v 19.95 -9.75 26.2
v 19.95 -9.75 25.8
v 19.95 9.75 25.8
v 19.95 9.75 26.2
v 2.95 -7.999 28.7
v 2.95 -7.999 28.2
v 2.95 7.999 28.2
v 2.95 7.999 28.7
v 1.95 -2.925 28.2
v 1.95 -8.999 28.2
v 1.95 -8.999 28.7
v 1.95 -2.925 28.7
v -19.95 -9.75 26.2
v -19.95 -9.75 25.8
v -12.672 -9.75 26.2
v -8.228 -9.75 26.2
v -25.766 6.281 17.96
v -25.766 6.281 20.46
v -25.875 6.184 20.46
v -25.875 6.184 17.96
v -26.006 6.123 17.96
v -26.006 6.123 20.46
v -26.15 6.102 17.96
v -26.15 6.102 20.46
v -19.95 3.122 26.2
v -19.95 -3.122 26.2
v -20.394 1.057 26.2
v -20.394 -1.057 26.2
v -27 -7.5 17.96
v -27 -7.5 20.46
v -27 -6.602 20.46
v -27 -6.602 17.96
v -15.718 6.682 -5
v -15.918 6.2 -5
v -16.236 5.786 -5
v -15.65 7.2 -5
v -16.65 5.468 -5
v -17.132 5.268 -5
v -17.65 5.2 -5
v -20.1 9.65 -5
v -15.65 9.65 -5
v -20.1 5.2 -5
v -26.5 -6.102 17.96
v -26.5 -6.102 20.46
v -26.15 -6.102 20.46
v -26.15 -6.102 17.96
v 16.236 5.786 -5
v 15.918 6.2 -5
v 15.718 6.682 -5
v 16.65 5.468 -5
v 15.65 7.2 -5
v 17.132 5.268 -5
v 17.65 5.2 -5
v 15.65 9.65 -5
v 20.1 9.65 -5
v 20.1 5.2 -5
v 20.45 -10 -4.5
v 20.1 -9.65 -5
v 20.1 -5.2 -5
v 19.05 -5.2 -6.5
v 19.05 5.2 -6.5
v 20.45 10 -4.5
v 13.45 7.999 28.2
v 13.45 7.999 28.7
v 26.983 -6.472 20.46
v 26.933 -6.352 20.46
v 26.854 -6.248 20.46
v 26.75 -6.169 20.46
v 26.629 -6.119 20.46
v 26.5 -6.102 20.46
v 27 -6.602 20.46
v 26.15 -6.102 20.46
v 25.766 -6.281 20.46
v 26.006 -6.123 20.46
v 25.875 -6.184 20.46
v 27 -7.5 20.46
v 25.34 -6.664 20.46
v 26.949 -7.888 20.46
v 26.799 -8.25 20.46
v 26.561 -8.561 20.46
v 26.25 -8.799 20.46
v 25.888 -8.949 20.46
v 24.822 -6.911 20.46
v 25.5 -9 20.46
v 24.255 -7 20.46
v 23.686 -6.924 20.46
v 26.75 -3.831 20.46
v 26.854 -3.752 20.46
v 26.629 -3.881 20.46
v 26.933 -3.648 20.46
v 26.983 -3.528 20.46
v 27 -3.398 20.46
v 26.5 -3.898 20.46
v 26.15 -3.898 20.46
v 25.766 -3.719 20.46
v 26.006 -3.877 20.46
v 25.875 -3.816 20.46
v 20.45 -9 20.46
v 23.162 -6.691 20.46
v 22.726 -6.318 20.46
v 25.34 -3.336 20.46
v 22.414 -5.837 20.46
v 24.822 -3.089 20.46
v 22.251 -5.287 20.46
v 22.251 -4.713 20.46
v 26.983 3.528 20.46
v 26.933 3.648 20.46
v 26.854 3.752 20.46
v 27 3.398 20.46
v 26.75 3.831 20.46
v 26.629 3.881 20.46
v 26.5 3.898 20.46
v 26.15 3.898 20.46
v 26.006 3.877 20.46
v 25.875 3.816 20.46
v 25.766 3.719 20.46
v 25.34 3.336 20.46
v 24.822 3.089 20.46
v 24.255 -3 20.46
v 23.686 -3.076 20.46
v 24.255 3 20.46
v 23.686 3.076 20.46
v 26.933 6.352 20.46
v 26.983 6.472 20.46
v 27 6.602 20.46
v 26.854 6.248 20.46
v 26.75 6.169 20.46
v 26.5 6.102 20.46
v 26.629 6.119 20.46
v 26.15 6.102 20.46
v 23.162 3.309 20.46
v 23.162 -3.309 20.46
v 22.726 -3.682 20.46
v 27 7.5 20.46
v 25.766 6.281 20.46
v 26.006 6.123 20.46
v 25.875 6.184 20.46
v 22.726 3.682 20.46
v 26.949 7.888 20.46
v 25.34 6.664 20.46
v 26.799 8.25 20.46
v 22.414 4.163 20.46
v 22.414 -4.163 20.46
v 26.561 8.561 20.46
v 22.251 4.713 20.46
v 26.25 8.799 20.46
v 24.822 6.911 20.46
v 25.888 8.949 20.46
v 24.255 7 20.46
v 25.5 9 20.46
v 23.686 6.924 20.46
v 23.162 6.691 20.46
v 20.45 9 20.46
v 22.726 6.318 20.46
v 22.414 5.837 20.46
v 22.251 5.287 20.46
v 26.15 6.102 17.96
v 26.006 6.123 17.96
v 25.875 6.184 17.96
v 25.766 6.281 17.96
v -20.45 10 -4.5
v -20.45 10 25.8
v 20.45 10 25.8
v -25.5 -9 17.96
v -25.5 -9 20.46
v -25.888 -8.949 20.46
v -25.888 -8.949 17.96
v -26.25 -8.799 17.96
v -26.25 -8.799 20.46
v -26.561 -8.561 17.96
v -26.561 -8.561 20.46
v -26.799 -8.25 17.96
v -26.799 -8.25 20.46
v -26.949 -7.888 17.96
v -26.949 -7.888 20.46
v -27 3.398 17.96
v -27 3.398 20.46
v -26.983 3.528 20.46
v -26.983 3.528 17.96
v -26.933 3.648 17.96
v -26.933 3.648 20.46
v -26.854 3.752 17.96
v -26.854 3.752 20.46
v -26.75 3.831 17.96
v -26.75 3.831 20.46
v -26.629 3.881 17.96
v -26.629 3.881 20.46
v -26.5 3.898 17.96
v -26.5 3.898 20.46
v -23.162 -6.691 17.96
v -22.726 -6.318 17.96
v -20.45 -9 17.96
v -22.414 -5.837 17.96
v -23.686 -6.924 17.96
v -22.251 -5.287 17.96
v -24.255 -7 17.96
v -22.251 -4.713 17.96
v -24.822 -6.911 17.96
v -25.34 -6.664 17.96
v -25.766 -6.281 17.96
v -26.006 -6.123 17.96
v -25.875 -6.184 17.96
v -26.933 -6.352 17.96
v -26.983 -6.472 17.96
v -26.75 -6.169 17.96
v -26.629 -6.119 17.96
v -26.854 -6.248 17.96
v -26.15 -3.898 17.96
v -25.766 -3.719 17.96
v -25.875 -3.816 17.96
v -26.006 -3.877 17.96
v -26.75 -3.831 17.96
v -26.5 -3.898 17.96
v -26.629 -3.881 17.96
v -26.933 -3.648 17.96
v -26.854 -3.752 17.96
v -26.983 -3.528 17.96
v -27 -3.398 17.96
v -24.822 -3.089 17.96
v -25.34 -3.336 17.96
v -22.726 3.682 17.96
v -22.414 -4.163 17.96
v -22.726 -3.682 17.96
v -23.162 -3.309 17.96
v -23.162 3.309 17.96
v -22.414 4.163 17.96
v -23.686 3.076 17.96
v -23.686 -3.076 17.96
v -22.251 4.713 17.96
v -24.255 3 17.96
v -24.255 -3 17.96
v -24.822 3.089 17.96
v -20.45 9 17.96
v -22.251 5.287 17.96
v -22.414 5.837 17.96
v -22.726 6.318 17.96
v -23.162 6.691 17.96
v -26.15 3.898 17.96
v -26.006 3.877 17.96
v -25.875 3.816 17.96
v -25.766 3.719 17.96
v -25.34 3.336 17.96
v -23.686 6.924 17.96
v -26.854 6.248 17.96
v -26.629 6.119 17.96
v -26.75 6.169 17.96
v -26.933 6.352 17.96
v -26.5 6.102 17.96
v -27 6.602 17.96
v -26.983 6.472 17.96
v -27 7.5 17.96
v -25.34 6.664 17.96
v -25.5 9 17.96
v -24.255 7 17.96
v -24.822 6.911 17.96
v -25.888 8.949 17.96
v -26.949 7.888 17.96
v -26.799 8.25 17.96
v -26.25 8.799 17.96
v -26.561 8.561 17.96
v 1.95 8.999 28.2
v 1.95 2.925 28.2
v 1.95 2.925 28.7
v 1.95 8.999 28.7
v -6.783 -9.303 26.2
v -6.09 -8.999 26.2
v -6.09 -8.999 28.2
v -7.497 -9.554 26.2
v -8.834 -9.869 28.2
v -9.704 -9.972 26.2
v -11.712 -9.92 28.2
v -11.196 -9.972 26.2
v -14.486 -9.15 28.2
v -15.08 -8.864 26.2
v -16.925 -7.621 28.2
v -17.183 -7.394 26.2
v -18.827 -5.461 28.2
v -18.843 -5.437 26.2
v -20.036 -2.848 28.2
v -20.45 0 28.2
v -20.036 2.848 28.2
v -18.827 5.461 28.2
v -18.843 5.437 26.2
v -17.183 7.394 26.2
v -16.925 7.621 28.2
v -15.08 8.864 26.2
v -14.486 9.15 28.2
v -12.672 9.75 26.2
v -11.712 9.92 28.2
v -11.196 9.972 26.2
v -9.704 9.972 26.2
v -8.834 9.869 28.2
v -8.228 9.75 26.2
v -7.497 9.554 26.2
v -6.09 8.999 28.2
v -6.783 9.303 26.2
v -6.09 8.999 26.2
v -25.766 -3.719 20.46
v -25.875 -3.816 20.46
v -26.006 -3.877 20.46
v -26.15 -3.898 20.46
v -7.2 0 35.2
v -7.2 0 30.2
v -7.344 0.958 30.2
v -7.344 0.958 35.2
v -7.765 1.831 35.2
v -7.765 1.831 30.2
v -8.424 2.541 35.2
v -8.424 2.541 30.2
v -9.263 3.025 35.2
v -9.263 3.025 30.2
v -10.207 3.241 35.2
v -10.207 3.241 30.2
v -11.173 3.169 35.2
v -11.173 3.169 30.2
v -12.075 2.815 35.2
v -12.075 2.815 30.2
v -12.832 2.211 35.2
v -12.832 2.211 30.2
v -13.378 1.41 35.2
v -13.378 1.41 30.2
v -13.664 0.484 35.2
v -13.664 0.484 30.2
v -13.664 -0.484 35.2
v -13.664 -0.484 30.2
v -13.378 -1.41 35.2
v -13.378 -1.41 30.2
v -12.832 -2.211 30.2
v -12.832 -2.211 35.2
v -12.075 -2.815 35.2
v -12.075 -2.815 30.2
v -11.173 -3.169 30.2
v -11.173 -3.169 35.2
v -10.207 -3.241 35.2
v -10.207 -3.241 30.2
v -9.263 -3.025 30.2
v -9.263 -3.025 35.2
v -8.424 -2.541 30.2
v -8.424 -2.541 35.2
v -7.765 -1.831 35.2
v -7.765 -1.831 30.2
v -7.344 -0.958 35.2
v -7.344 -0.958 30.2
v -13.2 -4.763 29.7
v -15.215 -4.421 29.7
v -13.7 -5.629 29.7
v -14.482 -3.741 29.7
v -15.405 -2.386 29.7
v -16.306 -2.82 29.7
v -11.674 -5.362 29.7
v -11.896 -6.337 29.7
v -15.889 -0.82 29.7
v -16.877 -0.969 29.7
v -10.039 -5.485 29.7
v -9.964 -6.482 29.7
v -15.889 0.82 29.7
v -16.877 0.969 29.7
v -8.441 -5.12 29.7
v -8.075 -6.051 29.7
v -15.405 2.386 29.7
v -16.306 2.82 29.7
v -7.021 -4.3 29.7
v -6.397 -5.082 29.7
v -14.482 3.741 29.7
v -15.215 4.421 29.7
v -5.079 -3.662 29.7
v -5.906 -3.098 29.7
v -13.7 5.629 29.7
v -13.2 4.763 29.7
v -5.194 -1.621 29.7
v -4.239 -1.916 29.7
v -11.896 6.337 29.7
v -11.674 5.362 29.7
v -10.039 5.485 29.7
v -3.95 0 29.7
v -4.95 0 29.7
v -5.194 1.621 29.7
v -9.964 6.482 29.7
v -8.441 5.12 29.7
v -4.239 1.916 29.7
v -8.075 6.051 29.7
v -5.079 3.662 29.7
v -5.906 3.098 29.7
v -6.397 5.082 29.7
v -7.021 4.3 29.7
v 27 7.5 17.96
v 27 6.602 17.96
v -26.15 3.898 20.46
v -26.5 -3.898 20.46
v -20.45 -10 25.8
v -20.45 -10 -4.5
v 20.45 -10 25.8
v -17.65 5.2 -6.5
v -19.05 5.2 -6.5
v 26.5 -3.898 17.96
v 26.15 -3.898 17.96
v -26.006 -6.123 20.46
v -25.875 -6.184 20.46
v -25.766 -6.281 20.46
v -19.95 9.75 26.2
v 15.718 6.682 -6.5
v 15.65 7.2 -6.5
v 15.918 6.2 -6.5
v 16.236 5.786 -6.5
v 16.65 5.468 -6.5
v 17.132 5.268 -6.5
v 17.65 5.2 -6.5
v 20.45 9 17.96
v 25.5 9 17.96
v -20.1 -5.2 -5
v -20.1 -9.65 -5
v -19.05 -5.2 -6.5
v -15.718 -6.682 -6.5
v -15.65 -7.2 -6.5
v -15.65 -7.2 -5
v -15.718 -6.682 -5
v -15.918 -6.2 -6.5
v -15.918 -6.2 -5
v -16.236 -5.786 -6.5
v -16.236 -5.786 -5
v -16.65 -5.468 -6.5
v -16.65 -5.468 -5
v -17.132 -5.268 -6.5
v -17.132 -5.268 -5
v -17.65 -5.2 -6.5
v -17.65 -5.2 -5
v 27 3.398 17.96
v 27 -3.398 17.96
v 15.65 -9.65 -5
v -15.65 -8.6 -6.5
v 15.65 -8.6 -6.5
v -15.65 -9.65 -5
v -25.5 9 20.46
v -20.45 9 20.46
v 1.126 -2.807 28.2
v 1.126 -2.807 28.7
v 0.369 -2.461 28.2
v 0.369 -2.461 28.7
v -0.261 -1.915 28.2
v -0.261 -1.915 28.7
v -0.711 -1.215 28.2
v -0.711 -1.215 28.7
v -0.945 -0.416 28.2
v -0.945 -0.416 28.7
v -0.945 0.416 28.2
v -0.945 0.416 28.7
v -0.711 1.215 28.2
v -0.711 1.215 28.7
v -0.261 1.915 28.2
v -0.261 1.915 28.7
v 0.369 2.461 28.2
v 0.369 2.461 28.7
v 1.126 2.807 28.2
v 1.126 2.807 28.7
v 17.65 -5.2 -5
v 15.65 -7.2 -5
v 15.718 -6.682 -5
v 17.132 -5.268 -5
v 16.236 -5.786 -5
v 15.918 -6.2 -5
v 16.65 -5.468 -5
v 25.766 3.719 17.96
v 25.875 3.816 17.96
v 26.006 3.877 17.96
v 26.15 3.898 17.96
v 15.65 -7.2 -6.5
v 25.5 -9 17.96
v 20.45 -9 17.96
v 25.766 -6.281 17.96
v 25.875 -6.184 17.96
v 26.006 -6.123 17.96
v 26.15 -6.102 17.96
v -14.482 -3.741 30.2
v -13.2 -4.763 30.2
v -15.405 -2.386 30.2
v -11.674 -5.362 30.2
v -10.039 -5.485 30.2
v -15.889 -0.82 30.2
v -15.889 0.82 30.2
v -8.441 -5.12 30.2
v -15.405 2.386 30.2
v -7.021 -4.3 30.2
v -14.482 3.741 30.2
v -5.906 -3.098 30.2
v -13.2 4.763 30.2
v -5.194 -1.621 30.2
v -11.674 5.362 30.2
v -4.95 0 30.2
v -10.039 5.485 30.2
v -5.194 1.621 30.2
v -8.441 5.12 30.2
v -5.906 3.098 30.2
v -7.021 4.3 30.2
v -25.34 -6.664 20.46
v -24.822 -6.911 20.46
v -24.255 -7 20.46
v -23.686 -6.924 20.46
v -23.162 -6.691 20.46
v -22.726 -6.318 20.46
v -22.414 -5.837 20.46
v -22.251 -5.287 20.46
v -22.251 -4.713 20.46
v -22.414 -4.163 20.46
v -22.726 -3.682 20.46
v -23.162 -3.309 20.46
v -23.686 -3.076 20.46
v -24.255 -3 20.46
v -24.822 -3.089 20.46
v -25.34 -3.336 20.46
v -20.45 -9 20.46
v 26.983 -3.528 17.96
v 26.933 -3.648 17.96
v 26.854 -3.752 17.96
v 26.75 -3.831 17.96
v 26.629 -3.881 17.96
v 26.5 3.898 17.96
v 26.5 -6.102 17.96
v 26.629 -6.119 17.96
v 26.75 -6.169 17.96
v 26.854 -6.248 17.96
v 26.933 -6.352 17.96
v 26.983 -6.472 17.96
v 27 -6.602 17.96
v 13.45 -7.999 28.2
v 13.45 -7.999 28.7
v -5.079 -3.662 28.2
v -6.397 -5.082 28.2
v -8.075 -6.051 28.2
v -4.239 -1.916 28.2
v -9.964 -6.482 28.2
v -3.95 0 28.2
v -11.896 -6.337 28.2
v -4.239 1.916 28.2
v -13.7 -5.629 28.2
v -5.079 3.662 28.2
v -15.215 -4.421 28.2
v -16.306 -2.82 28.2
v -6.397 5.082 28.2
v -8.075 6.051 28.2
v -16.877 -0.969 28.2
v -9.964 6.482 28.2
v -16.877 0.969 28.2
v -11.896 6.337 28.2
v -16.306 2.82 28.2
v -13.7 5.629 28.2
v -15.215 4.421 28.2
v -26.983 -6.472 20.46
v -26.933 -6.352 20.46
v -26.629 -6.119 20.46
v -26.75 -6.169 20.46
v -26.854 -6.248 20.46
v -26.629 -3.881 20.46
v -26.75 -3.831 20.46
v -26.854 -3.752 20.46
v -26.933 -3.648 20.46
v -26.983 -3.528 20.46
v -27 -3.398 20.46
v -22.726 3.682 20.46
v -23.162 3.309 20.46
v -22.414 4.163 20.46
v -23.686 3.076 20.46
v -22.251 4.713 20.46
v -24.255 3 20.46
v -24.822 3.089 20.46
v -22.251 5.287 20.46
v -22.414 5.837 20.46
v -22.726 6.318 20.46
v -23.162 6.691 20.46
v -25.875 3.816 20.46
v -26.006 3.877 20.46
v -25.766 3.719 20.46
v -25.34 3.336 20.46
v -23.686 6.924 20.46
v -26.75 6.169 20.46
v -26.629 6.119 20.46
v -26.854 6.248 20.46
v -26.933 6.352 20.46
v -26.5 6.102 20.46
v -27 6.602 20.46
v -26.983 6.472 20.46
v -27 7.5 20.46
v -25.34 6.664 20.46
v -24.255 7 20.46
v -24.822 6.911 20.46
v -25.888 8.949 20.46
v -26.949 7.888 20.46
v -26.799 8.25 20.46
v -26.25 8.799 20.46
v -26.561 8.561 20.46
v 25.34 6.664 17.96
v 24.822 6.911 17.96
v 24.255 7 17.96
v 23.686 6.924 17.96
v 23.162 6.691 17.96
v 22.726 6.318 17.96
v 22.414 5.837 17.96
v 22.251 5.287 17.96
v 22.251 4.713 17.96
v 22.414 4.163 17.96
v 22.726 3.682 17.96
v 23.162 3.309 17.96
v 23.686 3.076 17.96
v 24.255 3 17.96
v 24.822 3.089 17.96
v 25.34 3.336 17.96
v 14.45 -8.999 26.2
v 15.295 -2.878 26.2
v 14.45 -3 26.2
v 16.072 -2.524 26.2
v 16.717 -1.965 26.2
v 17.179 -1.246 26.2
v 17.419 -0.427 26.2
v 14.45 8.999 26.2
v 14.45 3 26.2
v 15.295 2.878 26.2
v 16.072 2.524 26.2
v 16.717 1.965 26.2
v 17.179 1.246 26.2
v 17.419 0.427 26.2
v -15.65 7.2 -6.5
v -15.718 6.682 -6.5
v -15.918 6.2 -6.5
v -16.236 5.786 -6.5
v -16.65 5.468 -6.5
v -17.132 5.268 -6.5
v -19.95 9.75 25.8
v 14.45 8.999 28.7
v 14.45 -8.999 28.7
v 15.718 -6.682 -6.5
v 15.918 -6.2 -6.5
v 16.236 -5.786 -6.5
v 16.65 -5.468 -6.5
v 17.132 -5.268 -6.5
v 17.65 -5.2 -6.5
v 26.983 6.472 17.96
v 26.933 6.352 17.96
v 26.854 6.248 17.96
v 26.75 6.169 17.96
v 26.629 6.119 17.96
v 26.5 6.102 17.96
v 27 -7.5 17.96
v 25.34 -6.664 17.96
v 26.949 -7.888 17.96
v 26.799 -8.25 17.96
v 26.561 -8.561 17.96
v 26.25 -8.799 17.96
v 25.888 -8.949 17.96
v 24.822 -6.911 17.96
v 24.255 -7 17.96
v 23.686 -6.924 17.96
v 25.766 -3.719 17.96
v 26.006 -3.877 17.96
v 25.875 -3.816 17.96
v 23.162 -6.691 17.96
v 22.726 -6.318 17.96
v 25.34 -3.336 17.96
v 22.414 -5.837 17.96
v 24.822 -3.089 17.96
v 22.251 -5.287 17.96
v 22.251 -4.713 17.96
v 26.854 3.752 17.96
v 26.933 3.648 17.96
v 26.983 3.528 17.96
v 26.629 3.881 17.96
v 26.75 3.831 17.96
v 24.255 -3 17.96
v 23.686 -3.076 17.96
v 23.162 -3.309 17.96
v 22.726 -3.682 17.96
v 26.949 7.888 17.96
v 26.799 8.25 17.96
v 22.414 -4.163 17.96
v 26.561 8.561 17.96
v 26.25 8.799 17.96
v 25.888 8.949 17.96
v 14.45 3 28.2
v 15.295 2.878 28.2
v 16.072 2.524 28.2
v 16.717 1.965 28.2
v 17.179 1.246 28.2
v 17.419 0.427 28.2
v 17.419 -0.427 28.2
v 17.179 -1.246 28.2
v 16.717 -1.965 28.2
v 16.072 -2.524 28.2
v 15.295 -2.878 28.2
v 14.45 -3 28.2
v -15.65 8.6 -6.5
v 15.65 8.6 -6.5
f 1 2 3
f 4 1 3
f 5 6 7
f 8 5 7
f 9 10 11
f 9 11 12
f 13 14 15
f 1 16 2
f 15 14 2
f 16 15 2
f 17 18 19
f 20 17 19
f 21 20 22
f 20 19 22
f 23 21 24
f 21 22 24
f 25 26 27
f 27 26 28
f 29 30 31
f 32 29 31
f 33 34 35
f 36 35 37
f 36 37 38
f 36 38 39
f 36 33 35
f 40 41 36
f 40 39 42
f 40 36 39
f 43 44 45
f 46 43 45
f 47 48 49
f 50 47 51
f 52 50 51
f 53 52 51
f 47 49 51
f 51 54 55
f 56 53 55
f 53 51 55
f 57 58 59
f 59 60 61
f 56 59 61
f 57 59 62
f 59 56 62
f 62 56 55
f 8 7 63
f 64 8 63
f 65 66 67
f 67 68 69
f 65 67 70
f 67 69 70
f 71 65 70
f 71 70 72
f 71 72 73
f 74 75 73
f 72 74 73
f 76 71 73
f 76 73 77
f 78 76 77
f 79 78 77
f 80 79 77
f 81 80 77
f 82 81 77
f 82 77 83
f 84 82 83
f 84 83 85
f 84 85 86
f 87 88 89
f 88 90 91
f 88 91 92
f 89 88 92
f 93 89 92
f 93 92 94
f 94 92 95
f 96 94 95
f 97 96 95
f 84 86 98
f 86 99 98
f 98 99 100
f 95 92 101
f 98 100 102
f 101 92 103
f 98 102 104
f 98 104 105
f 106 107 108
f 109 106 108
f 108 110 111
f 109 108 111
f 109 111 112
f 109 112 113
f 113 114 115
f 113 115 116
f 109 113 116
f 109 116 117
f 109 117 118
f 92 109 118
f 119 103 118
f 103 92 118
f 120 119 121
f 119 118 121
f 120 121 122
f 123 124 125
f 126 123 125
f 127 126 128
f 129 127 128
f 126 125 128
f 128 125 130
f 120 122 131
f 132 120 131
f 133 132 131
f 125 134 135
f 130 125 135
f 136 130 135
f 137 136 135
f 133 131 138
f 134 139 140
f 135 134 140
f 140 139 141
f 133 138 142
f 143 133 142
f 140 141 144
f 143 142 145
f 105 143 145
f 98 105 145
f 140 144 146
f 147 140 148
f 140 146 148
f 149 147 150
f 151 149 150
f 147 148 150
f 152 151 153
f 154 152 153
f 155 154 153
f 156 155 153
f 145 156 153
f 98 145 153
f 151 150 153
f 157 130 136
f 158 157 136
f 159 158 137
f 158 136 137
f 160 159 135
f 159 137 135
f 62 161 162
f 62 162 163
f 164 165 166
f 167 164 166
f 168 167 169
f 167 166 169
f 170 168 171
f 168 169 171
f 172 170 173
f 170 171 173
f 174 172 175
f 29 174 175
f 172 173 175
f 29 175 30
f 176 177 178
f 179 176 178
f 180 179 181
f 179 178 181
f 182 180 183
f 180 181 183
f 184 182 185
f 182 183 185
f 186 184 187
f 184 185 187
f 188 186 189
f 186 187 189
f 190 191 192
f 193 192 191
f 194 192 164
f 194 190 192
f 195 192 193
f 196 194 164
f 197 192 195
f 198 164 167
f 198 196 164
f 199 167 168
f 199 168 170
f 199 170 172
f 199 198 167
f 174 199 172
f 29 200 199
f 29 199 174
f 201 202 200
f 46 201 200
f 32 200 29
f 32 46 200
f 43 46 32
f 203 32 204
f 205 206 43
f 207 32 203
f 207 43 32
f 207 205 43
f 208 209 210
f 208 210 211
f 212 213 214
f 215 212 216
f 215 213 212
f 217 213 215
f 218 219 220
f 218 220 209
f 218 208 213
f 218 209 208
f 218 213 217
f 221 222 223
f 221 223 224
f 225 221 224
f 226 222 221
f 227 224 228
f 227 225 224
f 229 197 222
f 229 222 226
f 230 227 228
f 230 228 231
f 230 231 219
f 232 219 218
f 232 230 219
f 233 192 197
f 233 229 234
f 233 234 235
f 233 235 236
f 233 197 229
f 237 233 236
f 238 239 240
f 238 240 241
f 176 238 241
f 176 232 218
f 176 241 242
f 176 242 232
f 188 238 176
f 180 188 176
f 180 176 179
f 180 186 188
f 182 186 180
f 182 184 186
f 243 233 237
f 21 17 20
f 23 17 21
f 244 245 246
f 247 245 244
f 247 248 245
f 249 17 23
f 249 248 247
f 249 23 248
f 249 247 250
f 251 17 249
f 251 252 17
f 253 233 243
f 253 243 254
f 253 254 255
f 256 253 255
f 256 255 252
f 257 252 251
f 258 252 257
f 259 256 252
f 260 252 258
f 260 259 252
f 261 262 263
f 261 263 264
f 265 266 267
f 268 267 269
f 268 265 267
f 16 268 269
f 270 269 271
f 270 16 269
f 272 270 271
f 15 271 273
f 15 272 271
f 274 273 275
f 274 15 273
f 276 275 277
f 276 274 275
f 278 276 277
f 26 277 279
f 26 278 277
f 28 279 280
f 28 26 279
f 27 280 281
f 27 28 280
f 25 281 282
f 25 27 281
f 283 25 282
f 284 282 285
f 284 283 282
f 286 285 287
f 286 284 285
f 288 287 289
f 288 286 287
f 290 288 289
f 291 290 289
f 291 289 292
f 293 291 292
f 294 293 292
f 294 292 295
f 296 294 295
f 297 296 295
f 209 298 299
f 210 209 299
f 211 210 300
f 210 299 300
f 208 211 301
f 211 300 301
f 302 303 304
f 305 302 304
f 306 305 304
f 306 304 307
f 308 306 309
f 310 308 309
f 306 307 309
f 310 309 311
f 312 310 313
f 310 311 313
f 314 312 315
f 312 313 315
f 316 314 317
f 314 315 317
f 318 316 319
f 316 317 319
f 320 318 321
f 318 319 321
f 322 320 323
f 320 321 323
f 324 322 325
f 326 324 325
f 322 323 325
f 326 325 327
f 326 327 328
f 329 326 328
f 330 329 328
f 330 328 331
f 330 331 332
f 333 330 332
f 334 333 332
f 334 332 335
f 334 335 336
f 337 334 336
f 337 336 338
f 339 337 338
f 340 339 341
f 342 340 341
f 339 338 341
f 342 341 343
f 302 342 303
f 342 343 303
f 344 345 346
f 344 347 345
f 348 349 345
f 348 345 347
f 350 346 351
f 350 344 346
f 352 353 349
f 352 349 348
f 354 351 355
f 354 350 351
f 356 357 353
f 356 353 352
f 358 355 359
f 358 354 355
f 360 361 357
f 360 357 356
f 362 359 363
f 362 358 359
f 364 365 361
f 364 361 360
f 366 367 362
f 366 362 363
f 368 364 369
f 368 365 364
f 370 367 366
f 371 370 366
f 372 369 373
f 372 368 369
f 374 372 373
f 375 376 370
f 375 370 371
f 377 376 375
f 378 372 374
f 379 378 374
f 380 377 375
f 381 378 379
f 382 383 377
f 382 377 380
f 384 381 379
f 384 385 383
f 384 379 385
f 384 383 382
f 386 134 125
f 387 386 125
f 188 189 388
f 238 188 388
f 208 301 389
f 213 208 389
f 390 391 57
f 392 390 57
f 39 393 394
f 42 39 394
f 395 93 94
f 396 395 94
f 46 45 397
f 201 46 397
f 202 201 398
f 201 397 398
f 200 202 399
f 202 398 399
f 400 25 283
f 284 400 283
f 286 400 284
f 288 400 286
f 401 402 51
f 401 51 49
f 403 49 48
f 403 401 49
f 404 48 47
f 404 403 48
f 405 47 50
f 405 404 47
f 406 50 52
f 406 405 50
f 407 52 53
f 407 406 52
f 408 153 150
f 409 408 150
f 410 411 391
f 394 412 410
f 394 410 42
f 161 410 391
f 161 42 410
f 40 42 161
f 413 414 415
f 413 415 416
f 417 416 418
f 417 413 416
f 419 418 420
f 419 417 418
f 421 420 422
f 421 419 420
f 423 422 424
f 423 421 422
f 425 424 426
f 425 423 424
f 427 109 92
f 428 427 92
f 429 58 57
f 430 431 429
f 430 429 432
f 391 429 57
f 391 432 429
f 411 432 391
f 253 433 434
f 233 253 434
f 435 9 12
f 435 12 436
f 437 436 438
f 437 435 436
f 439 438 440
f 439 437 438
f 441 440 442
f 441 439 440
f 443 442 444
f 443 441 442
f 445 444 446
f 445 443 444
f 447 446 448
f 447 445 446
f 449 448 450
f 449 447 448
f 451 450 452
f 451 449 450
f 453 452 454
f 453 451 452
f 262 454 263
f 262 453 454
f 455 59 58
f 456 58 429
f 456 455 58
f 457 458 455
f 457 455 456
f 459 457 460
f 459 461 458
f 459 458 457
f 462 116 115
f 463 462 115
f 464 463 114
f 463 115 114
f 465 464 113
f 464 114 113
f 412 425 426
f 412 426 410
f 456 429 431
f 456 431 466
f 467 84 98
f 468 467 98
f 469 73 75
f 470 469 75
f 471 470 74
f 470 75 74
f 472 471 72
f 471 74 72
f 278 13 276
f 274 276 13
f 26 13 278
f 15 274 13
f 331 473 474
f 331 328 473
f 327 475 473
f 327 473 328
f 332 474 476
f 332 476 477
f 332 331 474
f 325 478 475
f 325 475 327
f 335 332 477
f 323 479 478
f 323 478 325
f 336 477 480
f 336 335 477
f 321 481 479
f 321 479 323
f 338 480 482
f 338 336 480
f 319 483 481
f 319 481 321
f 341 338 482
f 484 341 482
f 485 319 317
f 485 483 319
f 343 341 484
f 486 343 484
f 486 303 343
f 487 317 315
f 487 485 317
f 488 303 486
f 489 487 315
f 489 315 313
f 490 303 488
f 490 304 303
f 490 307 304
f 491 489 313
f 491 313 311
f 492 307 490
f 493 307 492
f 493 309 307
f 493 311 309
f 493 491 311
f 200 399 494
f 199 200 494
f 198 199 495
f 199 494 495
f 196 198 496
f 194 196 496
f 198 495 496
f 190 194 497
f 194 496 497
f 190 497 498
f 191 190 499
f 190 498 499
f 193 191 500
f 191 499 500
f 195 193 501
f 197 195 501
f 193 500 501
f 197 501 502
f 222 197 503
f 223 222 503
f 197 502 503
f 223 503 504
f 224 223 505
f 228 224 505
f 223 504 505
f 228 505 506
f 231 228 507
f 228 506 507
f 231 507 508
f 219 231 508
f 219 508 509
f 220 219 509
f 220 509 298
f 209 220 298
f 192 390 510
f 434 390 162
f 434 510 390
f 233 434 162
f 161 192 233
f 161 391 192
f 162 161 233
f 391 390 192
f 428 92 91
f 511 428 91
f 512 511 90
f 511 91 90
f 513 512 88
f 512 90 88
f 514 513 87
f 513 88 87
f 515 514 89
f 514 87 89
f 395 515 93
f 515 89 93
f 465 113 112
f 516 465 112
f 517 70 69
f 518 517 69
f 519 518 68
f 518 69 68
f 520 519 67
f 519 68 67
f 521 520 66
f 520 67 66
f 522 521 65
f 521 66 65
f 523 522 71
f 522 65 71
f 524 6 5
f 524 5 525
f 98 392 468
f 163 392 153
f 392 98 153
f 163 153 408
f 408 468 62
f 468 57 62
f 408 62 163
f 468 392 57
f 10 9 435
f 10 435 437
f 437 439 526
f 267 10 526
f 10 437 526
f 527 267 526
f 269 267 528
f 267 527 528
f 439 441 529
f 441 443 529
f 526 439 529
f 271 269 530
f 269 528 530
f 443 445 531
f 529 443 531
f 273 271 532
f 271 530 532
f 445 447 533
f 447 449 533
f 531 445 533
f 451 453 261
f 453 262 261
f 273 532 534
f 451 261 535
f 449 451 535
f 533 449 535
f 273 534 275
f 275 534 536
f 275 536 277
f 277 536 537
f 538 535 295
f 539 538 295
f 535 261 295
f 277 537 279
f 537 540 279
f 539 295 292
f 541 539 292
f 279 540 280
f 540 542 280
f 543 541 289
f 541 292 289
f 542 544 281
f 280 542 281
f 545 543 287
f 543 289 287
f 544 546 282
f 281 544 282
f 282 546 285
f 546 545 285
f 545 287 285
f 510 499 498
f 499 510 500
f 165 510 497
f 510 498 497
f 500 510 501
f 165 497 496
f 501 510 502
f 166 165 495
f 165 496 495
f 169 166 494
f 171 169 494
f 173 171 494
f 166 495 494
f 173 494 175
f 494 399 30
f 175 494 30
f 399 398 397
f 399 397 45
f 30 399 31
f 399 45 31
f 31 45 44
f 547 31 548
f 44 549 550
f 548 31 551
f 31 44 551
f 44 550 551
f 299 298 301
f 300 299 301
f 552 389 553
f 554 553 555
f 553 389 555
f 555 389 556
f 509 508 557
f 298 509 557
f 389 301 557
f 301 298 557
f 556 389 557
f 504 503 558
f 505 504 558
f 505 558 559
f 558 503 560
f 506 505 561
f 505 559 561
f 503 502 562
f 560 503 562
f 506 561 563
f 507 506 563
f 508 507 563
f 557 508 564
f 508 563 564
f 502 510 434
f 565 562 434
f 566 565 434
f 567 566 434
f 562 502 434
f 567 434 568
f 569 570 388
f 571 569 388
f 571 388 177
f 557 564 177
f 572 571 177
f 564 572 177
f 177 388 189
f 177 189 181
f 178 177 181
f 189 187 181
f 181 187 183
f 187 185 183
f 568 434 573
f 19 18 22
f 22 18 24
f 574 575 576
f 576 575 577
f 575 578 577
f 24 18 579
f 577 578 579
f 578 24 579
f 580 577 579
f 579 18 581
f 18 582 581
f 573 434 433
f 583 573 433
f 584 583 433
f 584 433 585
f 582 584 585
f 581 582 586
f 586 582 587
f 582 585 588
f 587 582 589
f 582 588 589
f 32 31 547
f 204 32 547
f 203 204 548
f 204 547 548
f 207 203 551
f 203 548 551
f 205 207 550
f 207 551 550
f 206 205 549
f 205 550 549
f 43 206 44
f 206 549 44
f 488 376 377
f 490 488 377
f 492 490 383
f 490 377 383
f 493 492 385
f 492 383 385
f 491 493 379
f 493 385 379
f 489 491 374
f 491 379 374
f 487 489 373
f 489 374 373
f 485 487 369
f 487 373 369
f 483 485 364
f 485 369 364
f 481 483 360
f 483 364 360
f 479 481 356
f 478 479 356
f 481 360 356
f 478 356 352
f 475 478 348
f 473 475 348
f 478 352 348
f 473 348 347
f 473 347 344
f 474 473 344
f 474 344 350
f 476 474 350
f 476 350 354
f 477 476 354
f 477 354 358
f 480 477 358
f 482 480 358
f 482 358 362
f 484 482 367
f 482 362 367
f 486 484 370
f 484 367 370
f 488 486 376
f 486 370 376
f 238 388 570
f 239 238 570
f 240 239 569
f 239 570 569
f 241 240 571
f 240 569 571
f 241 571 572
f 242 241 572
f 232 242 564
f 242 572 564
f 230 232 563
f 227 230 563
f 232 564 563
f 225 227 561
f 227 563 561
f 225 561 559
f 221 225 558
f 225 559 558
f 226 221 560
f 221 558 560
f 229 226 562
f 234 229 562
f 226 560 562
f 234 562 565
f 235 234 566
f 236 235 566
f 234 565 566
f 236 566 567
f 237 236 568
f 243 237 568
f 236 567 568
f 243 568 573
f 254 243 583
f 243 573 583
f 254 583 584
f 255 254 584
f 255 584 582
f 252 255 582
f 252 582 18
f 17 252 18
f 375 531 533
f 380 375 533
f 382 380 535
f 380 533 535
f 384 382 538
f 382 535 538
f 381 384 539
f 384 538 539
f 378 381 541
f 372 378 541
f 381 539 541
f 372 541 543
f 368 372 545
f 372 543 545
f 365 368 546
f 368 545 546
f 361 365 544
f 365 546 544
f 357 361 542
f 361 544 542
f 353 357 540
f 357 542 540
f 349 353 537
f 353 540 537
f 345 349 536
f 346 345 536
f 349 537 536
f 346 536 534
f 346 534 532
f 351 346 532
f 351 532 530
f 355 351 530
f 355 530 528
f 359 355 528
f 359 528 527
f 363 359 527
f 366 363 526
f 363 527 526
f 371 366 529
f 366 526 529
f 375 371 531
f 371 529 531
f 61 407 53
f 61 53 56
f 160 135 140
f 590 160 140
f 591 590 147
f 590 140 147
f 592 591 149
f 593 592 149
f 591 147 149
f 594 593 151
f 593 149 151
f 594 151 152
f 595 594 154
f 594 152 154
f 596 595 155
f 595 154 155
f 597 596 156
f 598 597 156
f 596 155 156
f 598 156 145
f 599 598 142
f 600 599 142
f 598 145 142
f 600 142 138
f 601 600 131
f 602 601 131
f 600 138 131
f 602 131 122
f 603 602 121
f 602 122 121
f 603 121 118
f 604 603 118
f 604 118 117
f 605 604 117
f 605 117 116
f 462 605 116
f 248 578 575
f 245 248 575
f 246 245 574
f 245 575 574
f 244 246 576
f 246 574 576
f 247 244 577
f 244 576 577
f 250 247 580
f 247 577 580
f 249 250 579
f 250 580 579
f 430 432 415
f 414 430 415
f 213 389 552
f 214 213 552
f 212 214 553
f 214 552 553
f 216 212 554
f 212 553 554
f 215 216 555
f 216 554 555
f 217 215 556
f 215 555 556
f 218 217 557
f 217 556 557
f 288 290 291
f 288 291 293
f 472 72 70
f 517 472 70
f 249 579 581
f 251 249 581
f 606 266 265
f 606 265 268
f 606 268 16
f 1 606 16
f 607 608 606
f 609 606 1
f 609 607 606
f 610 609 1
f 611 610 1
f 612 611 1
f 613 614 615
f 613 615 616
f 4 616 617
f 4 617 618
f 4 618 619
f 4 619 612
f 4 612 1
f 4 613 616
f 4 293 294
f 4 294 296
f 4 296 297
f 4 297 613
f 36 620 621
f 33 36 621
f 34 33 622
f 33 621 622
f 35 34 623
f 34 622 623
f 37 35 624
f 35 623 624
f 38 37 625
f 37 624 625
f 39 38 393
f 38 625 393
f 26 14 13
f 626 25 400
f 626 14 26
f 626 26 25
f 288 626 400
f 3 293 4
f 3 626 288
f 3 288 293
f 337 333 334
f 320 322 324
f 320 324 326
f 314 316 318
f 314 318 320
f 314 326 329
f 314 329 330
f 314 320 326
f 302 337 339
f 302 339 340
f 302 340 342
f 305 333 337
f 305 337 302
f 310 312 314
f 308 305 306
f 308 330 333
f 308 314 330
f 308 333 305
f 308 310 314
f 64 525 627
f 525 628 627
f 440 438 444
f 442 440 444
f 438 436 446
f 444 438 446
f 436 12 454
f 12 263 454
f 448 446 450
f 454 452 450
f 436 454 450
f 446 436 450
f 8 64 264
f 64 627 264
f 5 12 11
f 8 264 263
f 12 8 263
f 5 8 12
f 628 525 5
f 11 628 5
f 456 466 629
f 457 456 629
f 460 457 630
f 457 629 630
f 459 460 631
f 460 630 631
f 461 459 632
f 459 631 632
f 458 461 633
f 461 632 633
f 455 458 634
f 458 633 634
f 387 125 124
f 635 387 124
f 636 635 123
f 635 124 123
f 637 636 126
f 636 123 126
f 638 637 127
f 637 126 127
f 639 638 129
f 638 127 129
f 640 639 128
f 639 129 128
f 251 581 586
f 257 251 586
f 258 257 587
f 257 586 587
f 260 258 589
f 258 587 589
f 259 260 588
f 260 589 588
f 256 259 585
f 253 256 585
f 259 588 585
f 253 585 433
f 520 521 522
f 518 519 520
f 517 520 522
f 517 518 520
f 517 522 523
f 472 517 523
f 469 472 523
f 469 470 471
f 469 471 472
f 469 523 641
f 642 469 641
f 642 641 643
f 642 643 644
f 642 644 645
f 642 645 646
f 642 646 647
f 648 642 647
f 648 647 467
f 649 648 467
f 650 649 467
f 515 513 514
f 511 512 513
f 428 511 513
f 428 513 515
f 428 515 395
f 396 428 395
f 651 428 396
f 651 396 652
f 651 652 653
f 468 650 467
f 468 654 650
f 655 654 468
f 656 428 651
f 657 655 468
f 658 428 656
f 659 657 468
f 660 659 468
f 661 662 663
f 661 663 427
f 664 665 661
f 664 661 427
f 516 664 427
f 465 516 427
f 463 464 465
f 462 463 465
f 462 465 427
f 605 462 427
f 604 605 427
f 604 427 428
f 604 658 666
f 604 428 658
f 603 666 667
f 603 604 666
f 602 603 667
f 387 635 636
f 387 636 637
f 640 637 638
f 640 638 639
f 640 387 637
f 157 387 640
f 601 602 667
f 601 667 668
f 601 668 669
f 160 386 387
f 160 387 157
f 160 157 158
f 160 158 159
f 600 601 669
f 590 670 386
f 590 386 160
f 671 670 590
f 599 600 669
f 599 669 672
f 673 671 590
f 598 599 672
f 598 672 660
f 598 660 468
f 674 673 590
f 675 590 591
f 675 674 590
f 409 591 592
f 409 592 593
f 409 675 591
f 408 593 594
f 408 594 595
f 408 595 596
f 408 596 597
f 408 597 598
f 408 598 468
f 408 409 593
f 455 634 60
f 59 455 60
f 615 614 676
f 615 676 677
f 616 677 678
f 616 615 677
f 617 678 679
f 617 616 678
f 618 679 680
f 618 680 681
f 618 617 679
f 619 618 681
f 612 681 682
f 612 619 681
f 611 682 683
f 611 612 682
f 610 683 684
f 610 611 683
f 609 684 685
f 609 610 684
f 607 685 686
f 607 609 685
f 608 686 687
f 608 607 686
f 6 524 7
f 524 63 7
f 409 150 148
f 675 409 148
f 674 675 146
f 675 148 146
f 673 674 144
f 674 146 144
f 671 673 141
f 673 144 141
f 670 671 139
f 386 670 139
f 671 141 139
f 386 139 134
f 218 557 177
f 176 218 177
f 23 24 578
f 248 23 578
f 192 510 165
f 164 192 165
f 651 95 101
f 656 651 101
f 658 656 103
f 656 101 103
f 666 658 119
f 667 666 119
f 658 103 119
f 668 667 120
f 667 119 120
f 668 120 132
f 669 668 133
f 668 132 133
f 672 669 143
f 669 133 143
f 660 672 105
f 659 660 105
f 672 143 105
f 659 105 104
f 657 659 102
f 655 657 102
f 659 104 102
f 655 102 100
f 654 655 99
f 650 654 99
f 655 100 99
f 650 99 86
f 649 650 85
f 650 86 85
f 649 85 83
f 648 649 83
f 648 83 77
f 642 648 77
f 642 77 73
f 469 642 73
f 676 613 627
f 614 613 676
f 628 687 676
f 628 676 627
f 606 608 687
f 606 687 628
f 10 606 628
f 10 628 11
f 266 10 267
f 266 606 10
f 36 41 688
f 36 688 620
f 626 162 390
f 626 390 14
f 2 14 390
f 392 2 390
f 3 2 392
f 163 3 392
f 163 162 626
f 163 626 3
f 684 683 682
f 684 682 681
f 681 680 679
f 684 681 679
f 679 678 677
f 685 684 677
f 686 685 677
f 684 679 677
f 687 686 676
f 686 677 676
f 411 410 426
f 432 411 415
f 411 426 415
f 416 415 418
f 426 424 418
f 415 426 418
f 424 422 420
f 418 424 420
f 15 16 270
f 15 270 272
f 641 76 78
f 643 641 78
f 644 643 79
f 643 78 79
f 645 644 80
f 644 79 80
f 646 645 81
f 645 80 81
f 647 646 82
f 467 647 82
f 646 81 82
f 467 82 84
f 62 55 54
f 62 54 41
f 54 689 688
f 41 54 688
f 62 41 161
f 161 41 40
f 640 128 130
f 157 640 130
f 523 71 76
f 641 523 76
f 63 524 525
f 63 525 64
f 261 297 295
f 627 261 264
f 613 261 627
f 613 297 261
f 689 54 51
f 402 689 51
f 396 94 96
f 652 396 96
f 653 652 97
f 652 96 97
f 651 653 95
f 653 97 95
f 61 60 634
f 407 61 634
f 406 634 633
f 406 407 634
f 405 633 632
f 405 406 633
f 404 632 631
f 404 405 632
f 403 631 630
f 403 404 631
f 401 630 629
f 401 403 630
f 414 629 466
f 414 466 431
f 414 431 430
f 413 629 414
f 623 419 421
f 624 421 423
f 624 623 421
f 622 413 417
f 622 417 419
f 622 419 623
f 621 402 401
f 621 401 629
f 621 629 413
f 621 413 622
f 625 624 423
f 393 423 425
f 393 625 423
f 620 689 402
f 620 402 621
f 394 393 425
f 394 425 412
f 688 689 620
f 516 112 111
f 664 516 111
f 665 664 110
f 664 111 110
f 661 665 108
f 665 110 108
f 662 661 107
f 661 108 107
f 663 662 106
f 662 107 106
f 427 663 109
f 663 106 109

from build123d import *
from OCP.BRepFilletAPI import BRepFilletAPI_MakeChamfer

# Parameters (mm, degrees)
SKETCH1_W            = 40.9
SKETCH1_H            = 20
BOSS_EXTRUDE1_DEPTH  = 19.3
SKETCH2_W            = 40.9
SKETCH2_H            = 20
BOSS_EXTRUDE2_DEPTH  = 6.5
SKETCH3_W            = 40.9
SKETCH3_H            = 20
BOSS_EXTRUDE3_DEPTH  = 6.5
CHAMFER1_SIZE        = 2
CHAMFER1_SIZE2       = 1.400415076
CUT_EXTRUDE1_DEPTH   = 1.5
SKETCH5_W            = 39.9
SKETCH5_H            = 19.5
BOSS_EXTRUDE4_DEPTH  = 0.4
BOSS_EXTRUDE5_DEPTH  = 2
SKETCH7_R            = 6.5
BOSS_EXTRUDE6_DEPTH  = 1.5
SKETCH8_R            = 5.5
BOSS_EXTRUDE7_DEPTH  = 0.5
SKETCH9_R            = 3.25
BOSS_EXTRUDE8_DEPTH  = 5
SKETCH10_W           = 10.5
SKETCH10_H           = 15.998933302
BOSS_EXTRUDE9_DEPTH  = 0.5
BOSS_EXTRUDE10_START = -5.74
BOSS_EXTRUDE10_DEPTH = 2.5


with BuildPart() as part:
    # Sketch1 → Boss-Extrude1 (new body)
    with BuildSketch(Plane.XY):
        Rectangle(SKETCH1_W, SKETCH1_H)
    extrude(amount=BOSS_EXTRUDE1_DEPTH)

    # Sketch2 → Boss-Extrude2 (add)
    with BuildSketch(Plane(origin=(0, 0, 0), x_dir=(-1, 0, 0), z_dir=(0, 0, -1))):
        Rectangle(SKETCH2_W, SKETCH2_H)
    extrude(amount=BOSS_EXTRUDE2_DEPTH)

    # Sketch3 → Boss-Extrude3 (add)
    with BuildSketch(Plane.XY.offset(19.3)):
        Rectangle(SKETCH3_W, SKETCH3_H)
    extrude(amount=BOSS_EXTRUDE3_DEPTH)

    # Chamfer1: one chamfer whose edges measure the first distance from different faces: ONE call of the kernel's chamfer builder (chamfer() names one face for all edges)
    chamfer1_edges_1 = [part.edges().sort_by_distance(p)[0] for p in [
        (0, 10, -6.5),
    ]]
    chamfer1_side_1 = [part.faces().sort_by_distance(p)[0] for p in [
        (0, 10, 9.65),
    ]]
    chamfer1_edges_2 = [part.edges().sort_by_distance(p)[0] for p in [
        (20.45, 0, -6.5),
    ]]
    chamfer1_side_2 = [part.faces().sort_by_distance(p)[0] for p in [
        (20.45, 0, 9.65),
    ]]
    chamfer1_edges_3 = [part.edges().sort_by_distance(p)[0] for p in [
        (0, -10, -6.5),
    ]]
    chamfer1_side_3 = [part.faces().sort_by_distance(p)[0] for p in [
        (0, -10, 9.65),
    ]]
    chamfer1_edges_4 = [part.edges().sort_by_distance(p)[0] for p in [
        (-20.45, 0, -6.5),
    ]]
    chamfer1_side_4 = [part.faces().sort_by_distance(p)[0] for p in [
        (-20.45, 0, 9.65),
    ]]
    chamfer1 = BRepFilletAPI_MakeChamfer(part.part.solid().wrapped)
    for e in chamfer1_edges_1:
        chamfer1.Add(CHAMFER1_SIZE, CHAMFER1_SIZE2, e.wrapped, chamfer1_side_1[0].wrapped)  # the first distance lies on this face
    for e in chamfer1_edges_2:
        chamfer1.Add(CHAMFER1_SIZE, CHAMFER1_SIZE2, e.wrapped, chamfer1_side_2[0].wrapped)  # the first distance lies on this face
    for e in chamfer1_edges_3:
        chamfer1.Add(CHAMFER1_SIZE, CHAMFER1_SIZE2, e.wrapped, chamfer1_side_3[0].wrapped)  # the first distance lies on this face
    for e in chamfer1_edges_4:
        chamfer1.Add(CHAMFER1_SIZE, CHAMFER1_SIZE2, e.wrapped, chamfer1_side_4[0].wrapped)  # the first distance lies on this face
    add(Compound.cast(chamfer1.Shape()), mode=Mode.REPLACE)

    # Sketch4 → Cut-Extrude1 (cut)
    with BuildSketch(Plane(origin=(0, 0, -6.5), x_dir=(-1, 0, 0), z_dir=(0, 0, -1))):
        with BuildLine():
            Line((-20.45, 10), (-15.65, 10))
            Line((-15.65, 10), (-15.65, 7.2))
            ThreePointArc((-15.65, 7.2), (-16.235786438, 5.785786438), (-17.65, 5.2))
            Line((-17.65, 5.2), (-20.45, 5.2))
            Line((-20.45, 5.2), (-20.45, 10))
        make_face()
        with BuildLine():
            Line((15.65, 10), (15.65, 7.2))
            ThreePointArc((15.65, 7.2), (16.235786438, 5.785786438), (17.65, 5.2))
            Line((17.65, 5.2), (20.45, 5.2))
            Line((20.45, 5.2), (20.45, 10))
            Line((20.45, 10), (15.65, 10))
        make_face()
        with BuildLine():
            Line((20.45, -10), (15.65, -10))
            Line((15.65, -10), (15.65, -7.2))
            ThreePointArc((15.65, -7.2), (16.235786438, -5.785786438), (17.65, -5.2))
            Line((17.65, -5.2), (20.45, -5.2))
            Line((20.45, -5.2), (20.45, -10))
        make_face()
        with BuildLine():
            Line((-15.65, -10), (-15.65, -7.2))
            ThreePointArc((-15.65, -7.2), (-16.235786438, -5.785786438), (-17.65, -5.2))
            Line((-17.65, -5.2), (-20.45, -5.2))
            Line((-20.45, -5.2), (-20.45, -10))
            Line((-20.45, -10), (-15.65, -10))
        make_face()
    extrude(amount=-CUT_EXTRUDE1_DEPTH, mode=Mode.SUBTRACT)

    # Sketch5 → Boss-Extrude4 (add)
    with BuildSketch(Plane.XY.offset(25.8)):
        Rectangle(SKETCH5_W, SKETCH5_H)
    extrude(amount=BOSS_EXTRUDE4_DEPTH)

    # Sketch6 → Boss-Extrude5 (add)
    with BuildSketch(Plane.XY.offset(26.2)):
        with BuildLine():
            Line((-6.09, 8.999466651), (14.45, 8.999466651))
            Line((14.45, 8.999466651), (14.45, 3))
            ThreePointArc((14.45, 3), (17.45, 0), (14.45, -3))
            Line((14.45, -3), (14.45, -8.999466651))
            Line((14.45, -8.999466651), (-6.09, -8.999466651))
            ThreePointArc((-6.09, -8.999466651), (-20.45, 0), (-6.09, 8.999466651))
        make_face()
    extrude(amount=BOSS_EXTRUDE5_DEPTH)

    # Sketch7 → Boss-Extrude6 (add)
    with BuildSketch(Plane.XY.offset(28.2)):
        with Locations((-10.45, 0)):
            Circle(SKETCH7_R)
    extrude(amount=BOSS_EXTRUDE6_DEPTH)

    # Sketch8 → Boss-Extrude7 (add)
    with BuildSketch(Plane.XY.offset(29.7)):
        with Locations((-10.45, 0)):
            Circle(SKETCH8_R)
    extrude(amount=BOSS_EXTRUDE7_DEPTH)

    # Sketch9 → Boss-Extrude8 (add)
    with BuildSketch(Plane.XY.offset(30.2)):
        with Locations((-10.45, 0)):
            Circle(SKETCH9_R)
    extrude(amount=BOSS_EXTRUDE8_DEPTH)

    # Sketch10 → Boss-Extrude9 (add)
    with BuildSketch(Plane.XY.offset(28.2)):
        with BuildLine():
            Line((1.95, 8.999466651), (14.45, 8.999466651))
            Line((14.45, 8.999466651), (14.45, -8.999466651))
            Line((14.45, -8.999466651), (1.95, -8.999466651))
            Line((1.95, -8.999466651), (1.95, -2.925))
            ThreePointArc((1.95, -2.925), (-0.975, 0), (1.95, 2.925))
            Line((1.95, 2.925), (1.95, 8.999466651))
        make_face()
        with Locations((8.2, 0)):
            Rectangle(SKETCH10_W, SKETCH10_H, mode=Mode.SUBTRACT)
    extrude(amount=BOSS_EXTRUDE9_DEPTH)

    # Sketch11 → Boss-Extrude10 (add)
    with BuildSketch(Plane.XY.offset(26.2).offset(BOSS_EXTRUDE10_START)):
        with BuildLine():
            Line((20.45, 9), (25.5, 9))
            ThreePointArc((25.5, 9), (26.560660172, 8.560660172), (27, 7.5))
            Line((27, 7.5), (27, 6.601517979))
            ThreePointArc((27, 6.601517979), (26.853553391, 6.247964588), (26.5, 6.101517979))
            Line((26.5, 6.101517979), (26.150343239, 6.101517979))
            ThreePointArc((26.150343239, 6.101517979), (25.938390176, 6.148664914), (25.766408861, 6.281214383))
            ThreePointArc((25.766408861, 6.281214383), (22.23067135, 5), (25.766408861, 3.718785617))
            ThreePointArc((25.766408861, 3.718785617), (25.938390176, 3.851335086), (26.150343239, 3.898482021))
            Line((26.150343239, 3.898482021), (26.5, 3.898482021))
            ThreePointArc((26.5, 3.898482021), (26.853553391, 3.752035412), (27, 3.398482021))
            Line((27, 3.398482021), (27, -3.398482021))
            ThreePointArc((27, -3.398482021), (26.853553391, -3.752035412), (26.5, -3.898482021))
            Line((26.5, -3.898482021), (26.150343239, -3.898482021))
            ThreePointArc((26.150343239, -3.898482021), (25.938390176, -3.851335086), (25.766408861, -3.718785617))
            ThreePointArc((25.766408861, -3.718785617), (22.23067135, -5), (25.766408861, -6.281214383))
            ThreePointArc((25.766408861, -6.281214383), (25.938390176, -6.148664914), (26.150343239, -6.101517979))
            Line((26.150343239, -6.101517979), (26.5, -6.101517979))
            ThreePointArc((26.5, -6.101517979), (26.853553391, -6.247964588), (27, -6.601517979))
            Line((27, -6.601517979), (27, -7.5))
            ThreePointArc((27, -7.5), (26.560660172, -8.560660172), (25.5, -9))
            Line((25.5, -9), (20.45, -9))
            Line((20.45, -9), (20.45, 9))
        make_face()
        with BuildLine():
            Line((-20.45, -9), (-25.5, -9))
            ThreePointArc((-25.5, -9), (-26.560660172, -8.560660172), (-27, -7.5))
            Line((-27, -7.5), (-27, -6.601517979))
            ThreePointArc((-27, -6.601517979), (-26.853553391, -6.247964588), (-26.5, -6.101517979))
            Line((-26.5, -6.101517979), (-26.150343239, -6.101517979))
            ThreePointArc((-26.150343239, -6.101517979), (-25.938390176, -6.148664914), (-25.766408861, -6.281214383))
            ThreePointArc((-25.766408861, -6.281214383), (-22.23067135, -5), (-25.766408861, -3.718785617))
            ThreePointArc((-25.766408861, -3.718785617), (-25.938390176, -3.851335086), (-26.150343239, -3.898482021))
            Line((-26.150343239, -3.898482021), (-26.5, -3.898482021))
            ThreePointArc((-26.5, -3.898482021), (-26.853553391, -3.752035412), (-27, -3.398482021))
            Line((-27, -3.398482021), (-27, 3.398482021))
            ThreePointArc((-27, 3.398482021), (-26.853553391, 3.752035412), (-26.5, 3.898482021))
            Line((-26.5, 3.898482021), (-26.150343239, 3.898482021))
            ThreePointArc((-26.150343239, 3.898482021), (-25.938390176, 3.851335086), (-25.766408861, 3.718785617))
            ThreePointArc((-25.766408861, 3.718785617), (-22.23067135, 5), (-25.766408861, 6.281214383))
            ThreePointArc((-25.766408861, 6.281214383), (-25.938390176, 6.148664914), (-26.150343239, 6.101517979))
            Line((-26.150343239, 6.101517979), (-26.5, 6.101517979))
            ThreePointArc((-26.5, 6.101517979), (-26.853553391, 6.247964588), (-27, 6.601517979))
            Line((-27, 6.601517979), (-27, 7.5))
            ThreePointArc((-27, 7.5), (-26.560660172, 8.560660172), (-25.5, 9))
            Line((-25.5, 9), (-20.45, 9))
            Line((-20.45, 9), (-20.45, -9))
        make_face()
    extrude(amount=-BOSS_EXTRUDE10_DEPTH)


solid = part.part
